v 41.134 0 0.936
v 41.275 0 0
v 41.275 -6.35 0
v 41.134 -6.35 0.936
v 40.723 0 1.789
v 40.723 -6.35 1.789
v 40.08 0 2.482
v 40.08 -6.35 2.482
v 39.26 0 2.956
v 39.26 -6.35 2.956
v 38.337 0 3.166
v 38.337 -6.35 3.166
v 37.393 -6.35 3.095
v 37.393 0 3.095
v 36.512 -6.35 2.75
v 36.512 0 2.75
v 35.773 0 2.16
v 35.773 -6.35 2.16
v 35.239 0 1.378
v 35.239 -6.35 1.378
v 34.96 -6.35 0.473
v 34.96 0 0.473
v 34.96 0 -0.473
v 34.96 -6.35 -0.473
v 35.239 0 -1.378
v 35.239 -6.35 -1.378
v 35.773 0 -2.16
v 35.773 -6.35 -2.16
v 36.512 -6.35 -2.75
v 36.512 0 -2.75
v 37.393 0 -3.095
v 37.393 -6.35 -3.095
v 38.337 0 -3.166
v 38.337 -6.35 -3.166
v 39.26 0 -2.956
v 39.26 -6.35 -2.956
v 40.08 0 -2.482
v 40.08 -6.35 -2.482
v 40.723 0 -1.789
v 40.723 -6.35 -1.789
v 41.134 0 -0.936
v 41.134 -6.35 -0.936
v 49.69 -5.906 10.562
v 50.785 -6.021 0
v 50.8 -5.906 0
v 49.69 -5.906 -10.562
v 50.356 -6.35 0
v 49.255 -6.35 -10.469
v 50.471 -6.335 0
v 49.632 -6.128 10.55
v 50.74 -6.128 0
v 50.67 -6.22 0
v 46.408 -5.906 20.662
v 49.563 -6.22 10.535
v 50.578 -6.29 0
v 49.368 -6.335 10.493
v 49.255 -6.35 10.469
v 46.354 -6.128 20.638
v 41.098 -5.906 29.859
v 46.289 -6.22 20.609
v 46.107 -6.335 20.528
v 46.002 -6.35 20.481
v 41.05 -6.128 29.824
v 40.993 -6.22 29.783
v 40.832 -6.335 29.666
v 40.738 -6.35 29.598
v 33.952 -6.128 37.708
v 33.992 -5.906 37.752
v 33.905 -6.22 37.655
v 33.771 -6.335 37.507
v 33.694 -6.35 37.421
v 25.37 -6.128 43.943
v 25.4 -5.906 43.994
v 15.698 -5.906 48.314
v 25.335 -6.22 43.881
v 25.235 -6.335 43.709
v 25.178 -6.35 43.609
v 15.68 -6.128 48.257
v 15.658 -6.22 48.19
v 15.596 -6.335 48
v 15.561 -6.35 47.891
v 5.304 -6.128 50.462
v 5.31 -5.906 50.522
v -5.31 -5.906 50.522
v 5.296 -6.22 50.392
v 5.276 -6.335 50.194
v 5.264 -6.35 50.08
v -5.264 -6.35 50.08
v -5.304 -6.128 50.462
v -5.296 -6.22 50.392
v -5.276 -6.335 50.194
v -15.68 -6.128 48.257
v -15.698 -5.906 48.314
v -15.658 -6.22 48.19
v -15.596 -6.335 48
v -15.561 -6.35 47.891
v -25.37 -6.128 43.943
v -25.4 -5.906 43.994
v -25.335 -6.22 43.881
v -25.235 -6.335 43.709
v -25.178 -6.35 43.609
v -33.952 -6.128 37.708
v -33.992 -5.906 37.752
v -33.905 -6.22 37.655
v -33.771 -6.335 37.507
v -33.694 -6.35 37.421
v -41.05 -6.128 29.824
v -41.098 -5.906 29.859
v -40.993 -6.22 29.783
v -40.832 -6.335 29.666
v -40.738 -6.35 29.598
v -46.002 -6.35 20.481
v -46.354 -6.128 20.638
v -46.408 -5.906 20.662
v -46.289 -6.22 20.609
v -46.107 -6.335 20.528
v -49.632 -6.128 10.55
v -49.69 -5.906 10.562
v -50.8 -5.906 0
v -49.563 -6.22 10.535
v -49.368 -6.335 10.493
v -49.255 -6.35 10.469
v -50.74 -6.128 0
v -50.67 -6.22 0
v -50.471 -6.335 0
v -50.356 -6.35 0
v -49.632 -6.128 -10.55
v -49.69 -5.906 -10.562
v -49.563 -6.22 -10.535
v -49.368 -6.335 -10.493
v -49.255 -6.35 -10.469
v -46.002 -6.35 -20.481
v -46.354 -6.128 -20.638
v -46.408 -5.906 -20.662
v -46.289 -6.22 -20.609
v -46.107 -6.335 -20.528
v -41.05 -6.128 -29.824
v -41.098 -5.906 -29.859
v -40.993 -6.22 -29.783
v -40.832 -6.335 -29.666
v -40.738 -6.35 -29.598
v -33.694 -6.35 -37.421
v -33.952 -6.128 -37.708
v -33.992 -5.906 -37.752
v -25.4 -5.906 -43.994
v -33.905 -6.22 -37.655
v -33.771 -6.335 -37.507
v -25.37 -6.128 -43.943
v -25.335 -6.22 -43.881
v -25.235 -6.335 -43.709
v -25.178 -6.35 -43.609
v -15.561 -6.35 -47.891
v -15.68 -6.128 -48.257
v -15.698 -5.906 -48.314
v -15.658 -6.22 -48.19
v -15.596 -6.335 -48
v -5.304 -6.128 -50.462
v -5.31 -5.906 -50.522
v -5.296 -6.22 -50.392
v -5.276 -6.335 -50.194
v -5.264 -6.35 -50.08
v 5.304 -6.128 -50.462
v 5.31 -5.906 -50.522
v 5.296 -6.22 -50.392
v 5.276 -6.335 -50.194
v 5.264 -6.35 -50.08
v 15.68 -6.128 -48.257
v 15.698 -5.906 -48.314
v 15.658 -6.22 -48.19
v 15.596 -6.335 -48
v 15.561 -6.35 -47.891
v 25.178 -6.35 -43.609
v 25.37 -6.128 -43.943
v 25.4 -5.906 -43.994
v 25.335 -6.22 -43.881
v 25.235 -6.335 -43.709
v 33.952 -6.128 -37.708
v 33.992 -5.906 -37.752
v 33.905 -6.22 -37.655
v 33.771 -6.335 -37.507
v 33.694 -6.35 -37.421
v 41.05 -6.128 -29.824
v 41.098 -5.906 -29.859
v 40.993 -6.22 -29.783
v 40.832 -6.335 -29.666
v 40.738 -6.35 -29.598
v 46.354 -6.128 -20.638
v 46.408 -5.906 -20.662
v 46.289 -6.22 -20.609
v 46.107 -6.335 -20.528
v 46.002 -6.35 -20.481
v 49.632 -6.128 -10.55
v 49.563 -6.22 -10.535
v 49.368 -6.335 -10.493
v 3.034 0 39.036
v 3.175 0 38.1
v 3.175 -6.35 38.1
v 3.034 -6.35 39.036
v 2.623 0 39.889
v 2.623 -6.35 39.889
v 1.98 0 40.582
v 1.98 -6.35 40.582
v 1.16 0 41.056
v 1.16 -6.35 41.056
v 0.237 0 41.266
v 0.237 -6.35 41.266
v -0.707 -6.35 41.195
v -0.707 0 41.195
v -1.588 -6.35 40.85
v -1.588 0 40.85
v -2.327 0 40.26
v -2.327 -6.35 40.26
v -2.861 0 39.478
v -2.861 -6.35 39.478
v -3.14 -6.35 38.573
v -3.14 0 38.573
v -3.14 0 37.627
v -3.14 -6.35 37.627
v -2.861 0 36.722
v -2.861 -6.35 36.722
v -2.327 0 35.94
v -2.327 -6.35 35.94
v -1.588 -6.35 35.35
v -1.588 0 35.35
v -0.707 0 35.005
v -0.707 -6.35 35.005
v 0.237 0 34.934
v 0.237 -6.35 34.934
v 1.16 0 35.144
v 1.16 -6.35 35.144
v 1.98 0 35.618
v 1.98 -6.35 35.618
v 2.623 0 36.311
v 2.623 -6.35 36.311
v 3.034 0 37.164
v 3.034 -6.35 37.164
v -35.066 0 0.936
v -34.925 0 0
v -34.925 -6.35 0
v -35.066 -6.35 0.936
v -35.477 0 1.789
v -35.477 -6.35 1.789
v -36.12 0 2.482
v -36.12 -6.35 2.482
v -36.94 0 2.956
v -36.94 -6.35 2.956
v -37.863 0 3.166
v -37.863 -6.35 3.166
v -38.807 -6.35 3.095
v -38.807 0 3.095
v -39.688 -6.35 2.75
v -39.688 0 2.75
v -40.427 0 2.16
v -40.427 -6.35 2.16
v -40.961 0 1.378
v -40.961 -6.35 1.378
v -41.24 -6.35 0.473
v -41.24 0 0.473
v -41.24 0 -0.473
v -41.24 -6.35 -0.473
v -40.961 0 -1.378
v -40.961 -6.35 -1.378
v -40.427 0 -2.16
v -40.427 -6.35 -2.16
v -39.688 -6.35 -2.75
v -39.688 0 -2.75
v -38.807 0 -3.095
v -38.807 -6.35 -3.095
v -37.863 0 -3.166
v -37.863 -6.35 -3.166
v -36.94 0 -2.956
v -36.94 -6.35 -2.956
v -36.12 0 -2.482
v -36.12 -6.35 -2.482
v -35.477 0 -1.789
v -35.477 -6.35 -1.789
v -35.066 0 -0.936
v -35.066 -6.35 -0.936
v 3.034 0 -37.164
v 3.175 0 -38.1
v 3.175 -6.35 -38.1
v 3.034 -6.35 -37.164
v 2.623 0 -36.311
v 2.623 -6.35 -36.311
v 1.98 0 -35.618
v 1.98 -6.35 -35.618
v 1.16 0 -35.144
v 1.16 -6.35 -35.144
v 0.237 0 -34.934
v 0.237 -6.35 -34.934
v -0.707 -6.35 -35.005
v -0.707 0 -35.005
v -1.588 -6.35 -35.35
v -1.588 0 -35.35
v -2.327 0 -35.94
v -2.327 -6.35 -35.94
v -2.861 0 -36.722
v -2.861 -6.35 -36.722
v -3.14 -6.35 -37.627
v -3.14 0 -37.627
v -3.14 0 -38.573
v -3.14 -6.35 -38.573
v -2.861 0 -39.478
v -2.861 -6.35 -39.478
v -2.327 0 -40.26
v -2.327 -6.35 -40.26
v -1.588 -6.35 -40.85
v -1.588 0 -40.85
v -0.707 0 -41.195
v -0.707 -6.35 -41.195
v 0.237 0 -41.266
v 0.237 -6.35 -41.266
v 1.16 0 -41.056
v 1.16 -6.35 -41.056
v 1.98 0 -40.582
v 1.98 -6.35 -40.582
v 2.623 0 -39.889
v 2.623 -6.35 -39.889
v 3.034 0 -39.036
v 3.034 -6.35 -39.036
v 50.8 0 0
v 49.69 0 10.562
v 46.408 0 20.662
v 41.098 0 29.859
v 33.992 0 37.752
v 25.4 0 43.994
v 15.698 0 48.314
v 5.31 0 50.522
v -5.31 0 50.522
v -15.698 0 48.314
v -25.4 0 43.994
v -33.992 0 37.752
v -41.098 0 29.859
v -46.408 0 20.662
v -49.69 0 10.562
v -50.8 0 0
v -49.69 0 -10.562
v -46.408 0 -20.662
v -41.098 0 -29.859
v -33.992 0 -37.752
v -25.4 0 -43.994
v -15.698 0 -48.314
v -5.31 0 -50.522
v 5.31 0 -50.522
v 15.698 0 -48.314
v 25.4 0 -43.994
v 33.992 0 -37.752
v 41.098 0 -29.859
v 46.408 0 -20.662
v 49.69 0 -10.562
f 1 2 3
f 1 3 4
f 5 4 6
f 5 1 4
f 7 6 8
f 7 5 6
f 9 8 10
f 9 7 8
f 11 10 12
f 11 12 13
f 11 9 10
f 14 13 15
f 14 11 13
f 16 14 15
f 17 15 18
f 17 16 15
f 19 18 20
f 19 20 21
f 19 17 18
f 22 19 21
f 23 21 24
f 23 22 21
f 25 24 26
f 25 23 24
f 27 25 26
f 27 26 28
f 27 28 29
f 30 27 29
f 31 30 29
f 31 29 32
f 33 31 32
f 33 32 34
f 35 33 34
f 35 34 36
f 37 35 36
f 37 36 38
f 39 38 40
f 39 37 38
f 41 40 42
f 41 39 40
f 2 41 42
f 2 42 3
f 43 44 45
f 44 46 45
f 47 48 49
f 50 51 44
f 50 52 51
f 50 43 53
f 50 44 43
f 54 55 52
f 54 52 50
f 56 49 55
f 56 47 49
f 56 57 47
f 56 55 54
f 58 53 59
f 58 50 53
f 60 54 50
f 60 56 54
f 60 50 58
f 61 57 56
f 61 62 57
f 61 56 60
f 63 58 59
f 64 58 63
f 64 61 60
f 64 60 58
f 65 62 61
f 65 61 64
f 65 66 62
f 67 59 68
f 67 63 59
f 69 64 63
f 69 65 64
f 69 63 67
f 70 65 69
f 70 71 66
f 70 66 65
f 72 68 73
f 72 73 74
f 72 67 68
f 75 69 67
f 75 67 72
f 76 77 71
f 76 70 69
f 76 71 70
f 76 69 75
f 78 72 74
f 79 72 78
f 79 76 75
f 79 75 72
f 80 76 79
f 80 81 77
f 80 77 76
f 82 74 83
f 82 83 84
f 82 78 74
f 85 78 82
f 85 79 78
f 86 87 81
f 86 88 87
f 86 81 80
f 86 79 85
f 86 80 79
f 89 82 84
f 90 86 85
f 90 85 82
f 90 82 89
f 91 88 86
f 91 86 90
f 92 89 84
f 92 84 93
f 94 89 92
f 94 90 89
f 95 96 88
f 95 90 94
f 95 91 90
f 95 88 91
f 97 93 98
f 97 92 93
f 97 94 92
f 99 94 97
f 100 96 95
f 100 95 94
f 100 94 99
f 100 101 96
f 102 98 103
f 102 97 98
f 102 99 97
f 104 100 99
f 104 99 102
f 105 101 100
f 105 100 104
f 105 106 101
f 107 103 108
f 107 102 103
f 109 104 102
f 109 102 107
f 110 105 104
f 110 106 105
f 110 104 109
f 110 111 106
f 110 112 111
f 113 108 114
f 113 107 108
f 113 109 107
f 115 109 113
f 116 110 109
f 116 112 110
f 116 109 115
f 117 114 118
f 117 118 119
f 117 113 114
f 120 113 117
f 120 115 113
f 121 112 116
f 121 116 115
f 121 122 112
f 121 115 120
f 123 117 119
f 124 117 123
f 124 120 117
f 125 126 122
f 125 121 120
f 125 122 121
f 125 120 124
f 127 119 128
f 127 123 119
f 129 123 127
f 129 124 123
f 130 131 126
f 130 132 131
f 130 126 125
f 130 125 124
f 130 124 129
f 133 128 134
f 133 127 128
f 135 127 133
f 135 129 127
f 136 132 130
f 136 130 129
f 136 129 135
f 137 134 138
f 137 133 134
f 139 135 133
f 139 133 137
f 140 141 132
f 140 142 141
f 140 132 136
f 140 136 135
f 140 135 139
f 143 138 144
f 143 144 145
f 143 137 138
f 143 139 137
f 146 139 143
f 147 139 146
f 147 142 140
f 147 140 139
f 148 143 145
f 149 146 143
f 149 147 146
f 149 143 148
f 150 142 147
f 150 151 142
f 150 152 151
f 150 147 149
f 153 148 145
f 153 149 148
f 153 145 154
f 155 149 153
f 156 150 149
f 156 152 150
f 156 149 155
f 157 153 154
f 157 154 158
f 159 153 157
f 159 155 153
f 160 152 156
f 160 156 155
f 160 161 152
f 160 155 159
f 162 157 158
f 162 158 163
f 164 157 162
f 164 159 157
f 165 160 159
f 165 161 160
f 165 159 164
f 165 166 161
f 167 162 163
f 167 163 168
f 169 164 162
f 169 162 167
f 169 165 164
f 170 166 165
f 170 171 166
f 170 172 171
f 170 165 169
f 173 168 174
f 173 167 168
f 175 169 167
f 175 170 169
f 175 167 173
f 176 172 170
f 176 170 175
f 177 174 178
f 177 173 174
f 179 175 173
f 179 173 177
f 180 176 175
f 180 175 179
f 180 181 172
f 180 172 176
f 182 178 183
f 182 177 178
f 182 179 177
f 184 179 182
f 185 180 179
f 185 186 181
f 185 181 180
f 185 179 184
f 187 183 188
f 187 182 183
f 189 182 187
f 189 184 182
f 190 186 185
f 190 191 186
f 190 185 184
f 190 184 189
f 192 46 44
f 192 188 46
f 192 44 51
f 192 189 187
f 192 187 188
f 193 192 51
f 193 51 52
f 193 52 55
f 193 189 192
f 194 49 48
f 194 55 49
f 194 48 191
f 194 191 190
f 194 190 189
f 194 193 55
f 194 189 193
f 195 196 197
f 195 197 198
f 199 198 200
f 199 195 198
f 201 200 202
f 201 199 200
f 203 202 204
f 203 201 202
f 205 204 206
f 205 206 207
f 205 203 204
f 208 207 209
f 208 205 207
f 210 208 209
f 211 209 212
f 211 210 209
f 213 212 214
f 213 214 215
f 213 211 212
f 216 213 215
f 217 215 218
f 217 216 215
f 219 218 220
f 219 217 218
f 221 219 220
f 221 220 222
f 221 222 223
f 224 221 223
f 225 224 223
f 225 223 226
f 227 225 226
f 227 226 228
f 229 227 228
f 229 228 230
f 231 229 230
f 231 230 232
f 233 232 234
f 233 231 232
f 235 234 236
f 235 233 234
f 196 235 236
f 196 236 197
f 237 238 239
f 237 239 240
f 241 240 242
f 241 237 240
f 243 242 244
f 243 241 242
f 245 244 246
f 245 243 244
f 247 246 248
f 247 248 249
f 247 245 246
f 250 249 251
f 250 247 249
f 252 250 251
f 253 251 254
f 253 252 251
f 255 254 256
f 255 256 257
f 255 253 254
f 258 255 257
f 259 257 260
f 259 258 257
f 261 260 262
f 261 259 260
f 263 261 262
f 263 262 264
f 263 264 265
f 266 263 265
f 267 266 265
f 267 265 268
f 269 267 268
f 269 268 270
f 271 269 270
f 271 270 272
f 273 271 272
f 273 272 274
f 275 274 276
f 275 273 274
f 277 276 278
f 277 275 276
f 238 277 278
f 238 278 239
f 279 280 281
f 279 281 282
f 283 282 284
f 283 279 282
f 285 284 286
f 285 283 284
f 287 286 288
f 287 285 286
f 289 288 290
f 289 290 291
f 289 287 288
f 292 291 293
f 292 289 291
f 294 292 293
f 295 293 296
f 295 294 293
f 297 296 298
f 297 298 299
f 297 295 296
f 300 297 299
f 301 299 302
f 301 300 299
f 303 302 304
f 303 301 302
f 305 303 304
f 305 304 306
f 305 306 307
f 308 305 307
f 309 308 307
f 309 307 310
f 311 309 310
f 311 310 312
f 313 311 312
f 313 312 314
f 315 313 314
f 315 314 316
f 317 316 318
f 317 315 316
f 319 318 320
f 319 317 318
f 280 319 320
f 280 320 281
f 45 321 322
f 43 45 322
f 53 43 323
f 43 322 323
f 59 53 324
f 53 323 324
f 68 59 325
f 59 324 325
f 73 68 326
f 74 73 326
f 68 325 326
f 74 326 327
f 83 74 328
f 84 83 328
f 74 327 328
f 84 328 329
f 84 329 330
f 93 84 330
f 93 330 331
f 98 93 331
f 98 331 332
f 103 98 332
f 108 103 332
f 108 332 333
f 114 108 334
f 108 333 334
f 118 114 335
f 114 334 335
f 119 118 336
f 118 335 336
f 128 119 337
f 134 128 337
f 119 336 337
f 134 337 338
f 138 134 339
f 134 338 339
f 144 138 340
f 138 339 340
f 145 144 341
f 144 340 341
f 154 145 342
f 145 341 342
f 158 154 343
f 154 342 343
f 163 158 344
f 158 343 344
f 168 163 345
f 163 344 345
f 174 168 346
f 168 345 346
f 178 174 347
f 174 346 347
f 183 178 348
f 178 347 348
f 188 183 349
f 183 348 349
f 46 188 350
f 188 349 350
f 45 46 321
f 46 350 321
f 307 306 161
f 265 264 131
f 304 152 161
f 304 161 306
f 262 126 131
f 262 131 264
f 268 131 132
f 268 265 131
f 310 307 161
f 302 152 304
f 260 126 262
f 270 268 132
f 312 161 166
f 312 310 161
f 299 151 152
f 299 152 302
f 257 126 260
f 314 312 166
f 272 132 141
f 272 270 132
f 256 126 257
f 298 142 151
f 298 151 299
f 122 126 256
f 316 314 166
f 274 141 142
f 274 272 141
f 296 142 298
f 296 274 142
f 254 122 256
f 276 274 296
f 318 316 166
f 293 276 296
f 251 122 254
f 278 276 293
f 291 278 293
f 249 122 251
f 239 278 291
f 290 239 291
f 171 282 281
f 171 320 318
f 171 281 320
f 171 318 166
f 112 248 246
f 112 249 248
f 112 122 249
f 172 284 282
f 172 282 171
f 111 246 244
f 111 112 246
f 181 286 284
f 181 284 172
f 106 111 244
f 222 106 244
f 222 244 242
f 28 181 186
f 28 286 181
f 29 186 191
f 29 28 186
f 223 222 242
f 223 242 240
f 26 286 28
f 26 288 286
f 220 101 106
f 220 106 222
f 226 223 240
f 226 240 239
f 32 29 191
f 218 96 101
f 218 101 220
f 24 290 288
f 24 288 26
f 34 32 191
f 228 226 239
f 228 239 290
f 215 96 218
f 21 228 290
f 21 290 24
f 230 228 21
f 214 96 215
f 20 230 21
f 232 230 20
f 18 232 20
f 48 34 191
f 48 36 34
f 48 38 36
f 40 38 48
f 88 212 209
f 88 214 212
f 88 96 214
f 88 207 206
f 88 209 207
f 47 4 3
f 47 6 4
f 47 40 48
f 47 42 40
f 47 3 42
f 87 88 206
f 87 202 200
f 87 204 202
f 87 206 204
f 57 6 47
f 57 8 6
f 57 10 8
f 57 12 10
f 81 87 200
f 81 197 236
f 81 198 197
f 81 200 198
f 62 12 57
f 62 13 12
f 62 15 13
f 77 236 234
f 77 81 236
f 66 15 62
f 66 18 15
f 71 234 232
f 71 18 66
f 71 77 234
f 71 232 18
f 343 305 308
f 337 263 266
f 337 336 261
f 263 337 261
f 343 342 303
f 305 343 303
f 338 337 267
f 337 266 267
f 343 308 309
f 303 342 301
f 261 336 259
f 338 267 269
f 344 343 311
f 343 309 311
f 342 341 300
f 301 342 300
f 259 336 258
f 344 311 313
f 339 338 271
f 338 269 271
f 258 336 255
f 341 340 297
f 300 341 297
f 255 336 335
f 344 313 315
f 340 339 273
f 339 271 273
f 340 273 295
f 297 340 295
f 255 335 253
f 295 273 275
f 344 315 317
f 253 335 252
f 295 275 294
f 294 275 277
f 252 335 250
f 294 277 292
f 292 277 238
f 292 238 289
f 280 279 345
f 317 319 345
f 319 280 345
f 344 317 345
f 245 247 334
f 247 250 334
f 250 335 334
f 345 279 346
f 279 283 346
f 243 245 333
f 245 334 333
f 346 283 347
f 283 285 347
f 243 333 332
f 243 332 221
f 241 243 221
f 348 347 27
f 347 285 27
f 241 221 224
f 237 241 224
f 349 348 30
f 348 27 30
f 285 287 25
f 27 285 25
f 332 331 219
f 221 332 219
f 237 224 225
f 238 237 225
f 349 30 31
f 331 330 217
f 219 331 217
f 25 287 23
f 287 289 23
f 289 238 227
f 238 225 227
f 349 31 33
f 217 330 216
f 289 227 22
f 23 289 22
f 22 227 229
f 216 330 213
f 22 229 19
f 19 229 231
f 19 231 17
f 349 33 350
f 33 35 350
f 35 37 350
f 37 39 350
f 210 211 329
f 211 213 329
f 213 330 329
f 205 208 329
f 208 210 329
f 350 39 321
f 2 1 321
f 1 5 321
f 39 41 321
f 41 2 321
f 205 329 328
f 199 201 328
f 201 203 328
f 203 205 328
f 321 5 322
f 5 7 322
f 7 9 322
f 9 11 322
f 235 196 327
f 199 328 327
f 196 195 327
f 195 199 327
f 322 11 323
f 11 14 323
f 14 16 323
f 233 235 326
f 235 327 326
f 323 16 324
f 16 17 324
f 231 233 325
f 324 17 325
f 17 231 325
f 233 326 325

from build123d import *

# Parameters (mm, degrees)
F0_R     = 50.8
F0_R_2   = 3.175
F1_DEPTH = 6.35
F2_R     = 0.4445


with BuildPart() as f1:
    # F0 (on Front) → F1 (new body)
    with BuildSketch(Plane.XZ):
        Circle(F0_R)
        with Locations((0, -38.1)):
            Circle(F0_R_2, mode=Mode.SUBTRACT)
        with Locations((-38.1, 0)):
            Circle(F0_R_2, mode=Mode.SUBTRACT)
        with Locations((38.1, 0)):
            Circle(F0_R_2, mode=Mode.SUBTRACT)
        with Locations((0, 38.1)):
            Circle(F0_R_2, mode=Mode.SUBTRACT)
    extrude(amount=F1_DEPTH)

    # F2
    f2_edges = [f1.edges().sort_by_distance(p)[0] for p in [
        (-50.8, -6.35, 0),
    ]]
    fillet(f2_edges, radius=F2_R)


solid = f1.part
